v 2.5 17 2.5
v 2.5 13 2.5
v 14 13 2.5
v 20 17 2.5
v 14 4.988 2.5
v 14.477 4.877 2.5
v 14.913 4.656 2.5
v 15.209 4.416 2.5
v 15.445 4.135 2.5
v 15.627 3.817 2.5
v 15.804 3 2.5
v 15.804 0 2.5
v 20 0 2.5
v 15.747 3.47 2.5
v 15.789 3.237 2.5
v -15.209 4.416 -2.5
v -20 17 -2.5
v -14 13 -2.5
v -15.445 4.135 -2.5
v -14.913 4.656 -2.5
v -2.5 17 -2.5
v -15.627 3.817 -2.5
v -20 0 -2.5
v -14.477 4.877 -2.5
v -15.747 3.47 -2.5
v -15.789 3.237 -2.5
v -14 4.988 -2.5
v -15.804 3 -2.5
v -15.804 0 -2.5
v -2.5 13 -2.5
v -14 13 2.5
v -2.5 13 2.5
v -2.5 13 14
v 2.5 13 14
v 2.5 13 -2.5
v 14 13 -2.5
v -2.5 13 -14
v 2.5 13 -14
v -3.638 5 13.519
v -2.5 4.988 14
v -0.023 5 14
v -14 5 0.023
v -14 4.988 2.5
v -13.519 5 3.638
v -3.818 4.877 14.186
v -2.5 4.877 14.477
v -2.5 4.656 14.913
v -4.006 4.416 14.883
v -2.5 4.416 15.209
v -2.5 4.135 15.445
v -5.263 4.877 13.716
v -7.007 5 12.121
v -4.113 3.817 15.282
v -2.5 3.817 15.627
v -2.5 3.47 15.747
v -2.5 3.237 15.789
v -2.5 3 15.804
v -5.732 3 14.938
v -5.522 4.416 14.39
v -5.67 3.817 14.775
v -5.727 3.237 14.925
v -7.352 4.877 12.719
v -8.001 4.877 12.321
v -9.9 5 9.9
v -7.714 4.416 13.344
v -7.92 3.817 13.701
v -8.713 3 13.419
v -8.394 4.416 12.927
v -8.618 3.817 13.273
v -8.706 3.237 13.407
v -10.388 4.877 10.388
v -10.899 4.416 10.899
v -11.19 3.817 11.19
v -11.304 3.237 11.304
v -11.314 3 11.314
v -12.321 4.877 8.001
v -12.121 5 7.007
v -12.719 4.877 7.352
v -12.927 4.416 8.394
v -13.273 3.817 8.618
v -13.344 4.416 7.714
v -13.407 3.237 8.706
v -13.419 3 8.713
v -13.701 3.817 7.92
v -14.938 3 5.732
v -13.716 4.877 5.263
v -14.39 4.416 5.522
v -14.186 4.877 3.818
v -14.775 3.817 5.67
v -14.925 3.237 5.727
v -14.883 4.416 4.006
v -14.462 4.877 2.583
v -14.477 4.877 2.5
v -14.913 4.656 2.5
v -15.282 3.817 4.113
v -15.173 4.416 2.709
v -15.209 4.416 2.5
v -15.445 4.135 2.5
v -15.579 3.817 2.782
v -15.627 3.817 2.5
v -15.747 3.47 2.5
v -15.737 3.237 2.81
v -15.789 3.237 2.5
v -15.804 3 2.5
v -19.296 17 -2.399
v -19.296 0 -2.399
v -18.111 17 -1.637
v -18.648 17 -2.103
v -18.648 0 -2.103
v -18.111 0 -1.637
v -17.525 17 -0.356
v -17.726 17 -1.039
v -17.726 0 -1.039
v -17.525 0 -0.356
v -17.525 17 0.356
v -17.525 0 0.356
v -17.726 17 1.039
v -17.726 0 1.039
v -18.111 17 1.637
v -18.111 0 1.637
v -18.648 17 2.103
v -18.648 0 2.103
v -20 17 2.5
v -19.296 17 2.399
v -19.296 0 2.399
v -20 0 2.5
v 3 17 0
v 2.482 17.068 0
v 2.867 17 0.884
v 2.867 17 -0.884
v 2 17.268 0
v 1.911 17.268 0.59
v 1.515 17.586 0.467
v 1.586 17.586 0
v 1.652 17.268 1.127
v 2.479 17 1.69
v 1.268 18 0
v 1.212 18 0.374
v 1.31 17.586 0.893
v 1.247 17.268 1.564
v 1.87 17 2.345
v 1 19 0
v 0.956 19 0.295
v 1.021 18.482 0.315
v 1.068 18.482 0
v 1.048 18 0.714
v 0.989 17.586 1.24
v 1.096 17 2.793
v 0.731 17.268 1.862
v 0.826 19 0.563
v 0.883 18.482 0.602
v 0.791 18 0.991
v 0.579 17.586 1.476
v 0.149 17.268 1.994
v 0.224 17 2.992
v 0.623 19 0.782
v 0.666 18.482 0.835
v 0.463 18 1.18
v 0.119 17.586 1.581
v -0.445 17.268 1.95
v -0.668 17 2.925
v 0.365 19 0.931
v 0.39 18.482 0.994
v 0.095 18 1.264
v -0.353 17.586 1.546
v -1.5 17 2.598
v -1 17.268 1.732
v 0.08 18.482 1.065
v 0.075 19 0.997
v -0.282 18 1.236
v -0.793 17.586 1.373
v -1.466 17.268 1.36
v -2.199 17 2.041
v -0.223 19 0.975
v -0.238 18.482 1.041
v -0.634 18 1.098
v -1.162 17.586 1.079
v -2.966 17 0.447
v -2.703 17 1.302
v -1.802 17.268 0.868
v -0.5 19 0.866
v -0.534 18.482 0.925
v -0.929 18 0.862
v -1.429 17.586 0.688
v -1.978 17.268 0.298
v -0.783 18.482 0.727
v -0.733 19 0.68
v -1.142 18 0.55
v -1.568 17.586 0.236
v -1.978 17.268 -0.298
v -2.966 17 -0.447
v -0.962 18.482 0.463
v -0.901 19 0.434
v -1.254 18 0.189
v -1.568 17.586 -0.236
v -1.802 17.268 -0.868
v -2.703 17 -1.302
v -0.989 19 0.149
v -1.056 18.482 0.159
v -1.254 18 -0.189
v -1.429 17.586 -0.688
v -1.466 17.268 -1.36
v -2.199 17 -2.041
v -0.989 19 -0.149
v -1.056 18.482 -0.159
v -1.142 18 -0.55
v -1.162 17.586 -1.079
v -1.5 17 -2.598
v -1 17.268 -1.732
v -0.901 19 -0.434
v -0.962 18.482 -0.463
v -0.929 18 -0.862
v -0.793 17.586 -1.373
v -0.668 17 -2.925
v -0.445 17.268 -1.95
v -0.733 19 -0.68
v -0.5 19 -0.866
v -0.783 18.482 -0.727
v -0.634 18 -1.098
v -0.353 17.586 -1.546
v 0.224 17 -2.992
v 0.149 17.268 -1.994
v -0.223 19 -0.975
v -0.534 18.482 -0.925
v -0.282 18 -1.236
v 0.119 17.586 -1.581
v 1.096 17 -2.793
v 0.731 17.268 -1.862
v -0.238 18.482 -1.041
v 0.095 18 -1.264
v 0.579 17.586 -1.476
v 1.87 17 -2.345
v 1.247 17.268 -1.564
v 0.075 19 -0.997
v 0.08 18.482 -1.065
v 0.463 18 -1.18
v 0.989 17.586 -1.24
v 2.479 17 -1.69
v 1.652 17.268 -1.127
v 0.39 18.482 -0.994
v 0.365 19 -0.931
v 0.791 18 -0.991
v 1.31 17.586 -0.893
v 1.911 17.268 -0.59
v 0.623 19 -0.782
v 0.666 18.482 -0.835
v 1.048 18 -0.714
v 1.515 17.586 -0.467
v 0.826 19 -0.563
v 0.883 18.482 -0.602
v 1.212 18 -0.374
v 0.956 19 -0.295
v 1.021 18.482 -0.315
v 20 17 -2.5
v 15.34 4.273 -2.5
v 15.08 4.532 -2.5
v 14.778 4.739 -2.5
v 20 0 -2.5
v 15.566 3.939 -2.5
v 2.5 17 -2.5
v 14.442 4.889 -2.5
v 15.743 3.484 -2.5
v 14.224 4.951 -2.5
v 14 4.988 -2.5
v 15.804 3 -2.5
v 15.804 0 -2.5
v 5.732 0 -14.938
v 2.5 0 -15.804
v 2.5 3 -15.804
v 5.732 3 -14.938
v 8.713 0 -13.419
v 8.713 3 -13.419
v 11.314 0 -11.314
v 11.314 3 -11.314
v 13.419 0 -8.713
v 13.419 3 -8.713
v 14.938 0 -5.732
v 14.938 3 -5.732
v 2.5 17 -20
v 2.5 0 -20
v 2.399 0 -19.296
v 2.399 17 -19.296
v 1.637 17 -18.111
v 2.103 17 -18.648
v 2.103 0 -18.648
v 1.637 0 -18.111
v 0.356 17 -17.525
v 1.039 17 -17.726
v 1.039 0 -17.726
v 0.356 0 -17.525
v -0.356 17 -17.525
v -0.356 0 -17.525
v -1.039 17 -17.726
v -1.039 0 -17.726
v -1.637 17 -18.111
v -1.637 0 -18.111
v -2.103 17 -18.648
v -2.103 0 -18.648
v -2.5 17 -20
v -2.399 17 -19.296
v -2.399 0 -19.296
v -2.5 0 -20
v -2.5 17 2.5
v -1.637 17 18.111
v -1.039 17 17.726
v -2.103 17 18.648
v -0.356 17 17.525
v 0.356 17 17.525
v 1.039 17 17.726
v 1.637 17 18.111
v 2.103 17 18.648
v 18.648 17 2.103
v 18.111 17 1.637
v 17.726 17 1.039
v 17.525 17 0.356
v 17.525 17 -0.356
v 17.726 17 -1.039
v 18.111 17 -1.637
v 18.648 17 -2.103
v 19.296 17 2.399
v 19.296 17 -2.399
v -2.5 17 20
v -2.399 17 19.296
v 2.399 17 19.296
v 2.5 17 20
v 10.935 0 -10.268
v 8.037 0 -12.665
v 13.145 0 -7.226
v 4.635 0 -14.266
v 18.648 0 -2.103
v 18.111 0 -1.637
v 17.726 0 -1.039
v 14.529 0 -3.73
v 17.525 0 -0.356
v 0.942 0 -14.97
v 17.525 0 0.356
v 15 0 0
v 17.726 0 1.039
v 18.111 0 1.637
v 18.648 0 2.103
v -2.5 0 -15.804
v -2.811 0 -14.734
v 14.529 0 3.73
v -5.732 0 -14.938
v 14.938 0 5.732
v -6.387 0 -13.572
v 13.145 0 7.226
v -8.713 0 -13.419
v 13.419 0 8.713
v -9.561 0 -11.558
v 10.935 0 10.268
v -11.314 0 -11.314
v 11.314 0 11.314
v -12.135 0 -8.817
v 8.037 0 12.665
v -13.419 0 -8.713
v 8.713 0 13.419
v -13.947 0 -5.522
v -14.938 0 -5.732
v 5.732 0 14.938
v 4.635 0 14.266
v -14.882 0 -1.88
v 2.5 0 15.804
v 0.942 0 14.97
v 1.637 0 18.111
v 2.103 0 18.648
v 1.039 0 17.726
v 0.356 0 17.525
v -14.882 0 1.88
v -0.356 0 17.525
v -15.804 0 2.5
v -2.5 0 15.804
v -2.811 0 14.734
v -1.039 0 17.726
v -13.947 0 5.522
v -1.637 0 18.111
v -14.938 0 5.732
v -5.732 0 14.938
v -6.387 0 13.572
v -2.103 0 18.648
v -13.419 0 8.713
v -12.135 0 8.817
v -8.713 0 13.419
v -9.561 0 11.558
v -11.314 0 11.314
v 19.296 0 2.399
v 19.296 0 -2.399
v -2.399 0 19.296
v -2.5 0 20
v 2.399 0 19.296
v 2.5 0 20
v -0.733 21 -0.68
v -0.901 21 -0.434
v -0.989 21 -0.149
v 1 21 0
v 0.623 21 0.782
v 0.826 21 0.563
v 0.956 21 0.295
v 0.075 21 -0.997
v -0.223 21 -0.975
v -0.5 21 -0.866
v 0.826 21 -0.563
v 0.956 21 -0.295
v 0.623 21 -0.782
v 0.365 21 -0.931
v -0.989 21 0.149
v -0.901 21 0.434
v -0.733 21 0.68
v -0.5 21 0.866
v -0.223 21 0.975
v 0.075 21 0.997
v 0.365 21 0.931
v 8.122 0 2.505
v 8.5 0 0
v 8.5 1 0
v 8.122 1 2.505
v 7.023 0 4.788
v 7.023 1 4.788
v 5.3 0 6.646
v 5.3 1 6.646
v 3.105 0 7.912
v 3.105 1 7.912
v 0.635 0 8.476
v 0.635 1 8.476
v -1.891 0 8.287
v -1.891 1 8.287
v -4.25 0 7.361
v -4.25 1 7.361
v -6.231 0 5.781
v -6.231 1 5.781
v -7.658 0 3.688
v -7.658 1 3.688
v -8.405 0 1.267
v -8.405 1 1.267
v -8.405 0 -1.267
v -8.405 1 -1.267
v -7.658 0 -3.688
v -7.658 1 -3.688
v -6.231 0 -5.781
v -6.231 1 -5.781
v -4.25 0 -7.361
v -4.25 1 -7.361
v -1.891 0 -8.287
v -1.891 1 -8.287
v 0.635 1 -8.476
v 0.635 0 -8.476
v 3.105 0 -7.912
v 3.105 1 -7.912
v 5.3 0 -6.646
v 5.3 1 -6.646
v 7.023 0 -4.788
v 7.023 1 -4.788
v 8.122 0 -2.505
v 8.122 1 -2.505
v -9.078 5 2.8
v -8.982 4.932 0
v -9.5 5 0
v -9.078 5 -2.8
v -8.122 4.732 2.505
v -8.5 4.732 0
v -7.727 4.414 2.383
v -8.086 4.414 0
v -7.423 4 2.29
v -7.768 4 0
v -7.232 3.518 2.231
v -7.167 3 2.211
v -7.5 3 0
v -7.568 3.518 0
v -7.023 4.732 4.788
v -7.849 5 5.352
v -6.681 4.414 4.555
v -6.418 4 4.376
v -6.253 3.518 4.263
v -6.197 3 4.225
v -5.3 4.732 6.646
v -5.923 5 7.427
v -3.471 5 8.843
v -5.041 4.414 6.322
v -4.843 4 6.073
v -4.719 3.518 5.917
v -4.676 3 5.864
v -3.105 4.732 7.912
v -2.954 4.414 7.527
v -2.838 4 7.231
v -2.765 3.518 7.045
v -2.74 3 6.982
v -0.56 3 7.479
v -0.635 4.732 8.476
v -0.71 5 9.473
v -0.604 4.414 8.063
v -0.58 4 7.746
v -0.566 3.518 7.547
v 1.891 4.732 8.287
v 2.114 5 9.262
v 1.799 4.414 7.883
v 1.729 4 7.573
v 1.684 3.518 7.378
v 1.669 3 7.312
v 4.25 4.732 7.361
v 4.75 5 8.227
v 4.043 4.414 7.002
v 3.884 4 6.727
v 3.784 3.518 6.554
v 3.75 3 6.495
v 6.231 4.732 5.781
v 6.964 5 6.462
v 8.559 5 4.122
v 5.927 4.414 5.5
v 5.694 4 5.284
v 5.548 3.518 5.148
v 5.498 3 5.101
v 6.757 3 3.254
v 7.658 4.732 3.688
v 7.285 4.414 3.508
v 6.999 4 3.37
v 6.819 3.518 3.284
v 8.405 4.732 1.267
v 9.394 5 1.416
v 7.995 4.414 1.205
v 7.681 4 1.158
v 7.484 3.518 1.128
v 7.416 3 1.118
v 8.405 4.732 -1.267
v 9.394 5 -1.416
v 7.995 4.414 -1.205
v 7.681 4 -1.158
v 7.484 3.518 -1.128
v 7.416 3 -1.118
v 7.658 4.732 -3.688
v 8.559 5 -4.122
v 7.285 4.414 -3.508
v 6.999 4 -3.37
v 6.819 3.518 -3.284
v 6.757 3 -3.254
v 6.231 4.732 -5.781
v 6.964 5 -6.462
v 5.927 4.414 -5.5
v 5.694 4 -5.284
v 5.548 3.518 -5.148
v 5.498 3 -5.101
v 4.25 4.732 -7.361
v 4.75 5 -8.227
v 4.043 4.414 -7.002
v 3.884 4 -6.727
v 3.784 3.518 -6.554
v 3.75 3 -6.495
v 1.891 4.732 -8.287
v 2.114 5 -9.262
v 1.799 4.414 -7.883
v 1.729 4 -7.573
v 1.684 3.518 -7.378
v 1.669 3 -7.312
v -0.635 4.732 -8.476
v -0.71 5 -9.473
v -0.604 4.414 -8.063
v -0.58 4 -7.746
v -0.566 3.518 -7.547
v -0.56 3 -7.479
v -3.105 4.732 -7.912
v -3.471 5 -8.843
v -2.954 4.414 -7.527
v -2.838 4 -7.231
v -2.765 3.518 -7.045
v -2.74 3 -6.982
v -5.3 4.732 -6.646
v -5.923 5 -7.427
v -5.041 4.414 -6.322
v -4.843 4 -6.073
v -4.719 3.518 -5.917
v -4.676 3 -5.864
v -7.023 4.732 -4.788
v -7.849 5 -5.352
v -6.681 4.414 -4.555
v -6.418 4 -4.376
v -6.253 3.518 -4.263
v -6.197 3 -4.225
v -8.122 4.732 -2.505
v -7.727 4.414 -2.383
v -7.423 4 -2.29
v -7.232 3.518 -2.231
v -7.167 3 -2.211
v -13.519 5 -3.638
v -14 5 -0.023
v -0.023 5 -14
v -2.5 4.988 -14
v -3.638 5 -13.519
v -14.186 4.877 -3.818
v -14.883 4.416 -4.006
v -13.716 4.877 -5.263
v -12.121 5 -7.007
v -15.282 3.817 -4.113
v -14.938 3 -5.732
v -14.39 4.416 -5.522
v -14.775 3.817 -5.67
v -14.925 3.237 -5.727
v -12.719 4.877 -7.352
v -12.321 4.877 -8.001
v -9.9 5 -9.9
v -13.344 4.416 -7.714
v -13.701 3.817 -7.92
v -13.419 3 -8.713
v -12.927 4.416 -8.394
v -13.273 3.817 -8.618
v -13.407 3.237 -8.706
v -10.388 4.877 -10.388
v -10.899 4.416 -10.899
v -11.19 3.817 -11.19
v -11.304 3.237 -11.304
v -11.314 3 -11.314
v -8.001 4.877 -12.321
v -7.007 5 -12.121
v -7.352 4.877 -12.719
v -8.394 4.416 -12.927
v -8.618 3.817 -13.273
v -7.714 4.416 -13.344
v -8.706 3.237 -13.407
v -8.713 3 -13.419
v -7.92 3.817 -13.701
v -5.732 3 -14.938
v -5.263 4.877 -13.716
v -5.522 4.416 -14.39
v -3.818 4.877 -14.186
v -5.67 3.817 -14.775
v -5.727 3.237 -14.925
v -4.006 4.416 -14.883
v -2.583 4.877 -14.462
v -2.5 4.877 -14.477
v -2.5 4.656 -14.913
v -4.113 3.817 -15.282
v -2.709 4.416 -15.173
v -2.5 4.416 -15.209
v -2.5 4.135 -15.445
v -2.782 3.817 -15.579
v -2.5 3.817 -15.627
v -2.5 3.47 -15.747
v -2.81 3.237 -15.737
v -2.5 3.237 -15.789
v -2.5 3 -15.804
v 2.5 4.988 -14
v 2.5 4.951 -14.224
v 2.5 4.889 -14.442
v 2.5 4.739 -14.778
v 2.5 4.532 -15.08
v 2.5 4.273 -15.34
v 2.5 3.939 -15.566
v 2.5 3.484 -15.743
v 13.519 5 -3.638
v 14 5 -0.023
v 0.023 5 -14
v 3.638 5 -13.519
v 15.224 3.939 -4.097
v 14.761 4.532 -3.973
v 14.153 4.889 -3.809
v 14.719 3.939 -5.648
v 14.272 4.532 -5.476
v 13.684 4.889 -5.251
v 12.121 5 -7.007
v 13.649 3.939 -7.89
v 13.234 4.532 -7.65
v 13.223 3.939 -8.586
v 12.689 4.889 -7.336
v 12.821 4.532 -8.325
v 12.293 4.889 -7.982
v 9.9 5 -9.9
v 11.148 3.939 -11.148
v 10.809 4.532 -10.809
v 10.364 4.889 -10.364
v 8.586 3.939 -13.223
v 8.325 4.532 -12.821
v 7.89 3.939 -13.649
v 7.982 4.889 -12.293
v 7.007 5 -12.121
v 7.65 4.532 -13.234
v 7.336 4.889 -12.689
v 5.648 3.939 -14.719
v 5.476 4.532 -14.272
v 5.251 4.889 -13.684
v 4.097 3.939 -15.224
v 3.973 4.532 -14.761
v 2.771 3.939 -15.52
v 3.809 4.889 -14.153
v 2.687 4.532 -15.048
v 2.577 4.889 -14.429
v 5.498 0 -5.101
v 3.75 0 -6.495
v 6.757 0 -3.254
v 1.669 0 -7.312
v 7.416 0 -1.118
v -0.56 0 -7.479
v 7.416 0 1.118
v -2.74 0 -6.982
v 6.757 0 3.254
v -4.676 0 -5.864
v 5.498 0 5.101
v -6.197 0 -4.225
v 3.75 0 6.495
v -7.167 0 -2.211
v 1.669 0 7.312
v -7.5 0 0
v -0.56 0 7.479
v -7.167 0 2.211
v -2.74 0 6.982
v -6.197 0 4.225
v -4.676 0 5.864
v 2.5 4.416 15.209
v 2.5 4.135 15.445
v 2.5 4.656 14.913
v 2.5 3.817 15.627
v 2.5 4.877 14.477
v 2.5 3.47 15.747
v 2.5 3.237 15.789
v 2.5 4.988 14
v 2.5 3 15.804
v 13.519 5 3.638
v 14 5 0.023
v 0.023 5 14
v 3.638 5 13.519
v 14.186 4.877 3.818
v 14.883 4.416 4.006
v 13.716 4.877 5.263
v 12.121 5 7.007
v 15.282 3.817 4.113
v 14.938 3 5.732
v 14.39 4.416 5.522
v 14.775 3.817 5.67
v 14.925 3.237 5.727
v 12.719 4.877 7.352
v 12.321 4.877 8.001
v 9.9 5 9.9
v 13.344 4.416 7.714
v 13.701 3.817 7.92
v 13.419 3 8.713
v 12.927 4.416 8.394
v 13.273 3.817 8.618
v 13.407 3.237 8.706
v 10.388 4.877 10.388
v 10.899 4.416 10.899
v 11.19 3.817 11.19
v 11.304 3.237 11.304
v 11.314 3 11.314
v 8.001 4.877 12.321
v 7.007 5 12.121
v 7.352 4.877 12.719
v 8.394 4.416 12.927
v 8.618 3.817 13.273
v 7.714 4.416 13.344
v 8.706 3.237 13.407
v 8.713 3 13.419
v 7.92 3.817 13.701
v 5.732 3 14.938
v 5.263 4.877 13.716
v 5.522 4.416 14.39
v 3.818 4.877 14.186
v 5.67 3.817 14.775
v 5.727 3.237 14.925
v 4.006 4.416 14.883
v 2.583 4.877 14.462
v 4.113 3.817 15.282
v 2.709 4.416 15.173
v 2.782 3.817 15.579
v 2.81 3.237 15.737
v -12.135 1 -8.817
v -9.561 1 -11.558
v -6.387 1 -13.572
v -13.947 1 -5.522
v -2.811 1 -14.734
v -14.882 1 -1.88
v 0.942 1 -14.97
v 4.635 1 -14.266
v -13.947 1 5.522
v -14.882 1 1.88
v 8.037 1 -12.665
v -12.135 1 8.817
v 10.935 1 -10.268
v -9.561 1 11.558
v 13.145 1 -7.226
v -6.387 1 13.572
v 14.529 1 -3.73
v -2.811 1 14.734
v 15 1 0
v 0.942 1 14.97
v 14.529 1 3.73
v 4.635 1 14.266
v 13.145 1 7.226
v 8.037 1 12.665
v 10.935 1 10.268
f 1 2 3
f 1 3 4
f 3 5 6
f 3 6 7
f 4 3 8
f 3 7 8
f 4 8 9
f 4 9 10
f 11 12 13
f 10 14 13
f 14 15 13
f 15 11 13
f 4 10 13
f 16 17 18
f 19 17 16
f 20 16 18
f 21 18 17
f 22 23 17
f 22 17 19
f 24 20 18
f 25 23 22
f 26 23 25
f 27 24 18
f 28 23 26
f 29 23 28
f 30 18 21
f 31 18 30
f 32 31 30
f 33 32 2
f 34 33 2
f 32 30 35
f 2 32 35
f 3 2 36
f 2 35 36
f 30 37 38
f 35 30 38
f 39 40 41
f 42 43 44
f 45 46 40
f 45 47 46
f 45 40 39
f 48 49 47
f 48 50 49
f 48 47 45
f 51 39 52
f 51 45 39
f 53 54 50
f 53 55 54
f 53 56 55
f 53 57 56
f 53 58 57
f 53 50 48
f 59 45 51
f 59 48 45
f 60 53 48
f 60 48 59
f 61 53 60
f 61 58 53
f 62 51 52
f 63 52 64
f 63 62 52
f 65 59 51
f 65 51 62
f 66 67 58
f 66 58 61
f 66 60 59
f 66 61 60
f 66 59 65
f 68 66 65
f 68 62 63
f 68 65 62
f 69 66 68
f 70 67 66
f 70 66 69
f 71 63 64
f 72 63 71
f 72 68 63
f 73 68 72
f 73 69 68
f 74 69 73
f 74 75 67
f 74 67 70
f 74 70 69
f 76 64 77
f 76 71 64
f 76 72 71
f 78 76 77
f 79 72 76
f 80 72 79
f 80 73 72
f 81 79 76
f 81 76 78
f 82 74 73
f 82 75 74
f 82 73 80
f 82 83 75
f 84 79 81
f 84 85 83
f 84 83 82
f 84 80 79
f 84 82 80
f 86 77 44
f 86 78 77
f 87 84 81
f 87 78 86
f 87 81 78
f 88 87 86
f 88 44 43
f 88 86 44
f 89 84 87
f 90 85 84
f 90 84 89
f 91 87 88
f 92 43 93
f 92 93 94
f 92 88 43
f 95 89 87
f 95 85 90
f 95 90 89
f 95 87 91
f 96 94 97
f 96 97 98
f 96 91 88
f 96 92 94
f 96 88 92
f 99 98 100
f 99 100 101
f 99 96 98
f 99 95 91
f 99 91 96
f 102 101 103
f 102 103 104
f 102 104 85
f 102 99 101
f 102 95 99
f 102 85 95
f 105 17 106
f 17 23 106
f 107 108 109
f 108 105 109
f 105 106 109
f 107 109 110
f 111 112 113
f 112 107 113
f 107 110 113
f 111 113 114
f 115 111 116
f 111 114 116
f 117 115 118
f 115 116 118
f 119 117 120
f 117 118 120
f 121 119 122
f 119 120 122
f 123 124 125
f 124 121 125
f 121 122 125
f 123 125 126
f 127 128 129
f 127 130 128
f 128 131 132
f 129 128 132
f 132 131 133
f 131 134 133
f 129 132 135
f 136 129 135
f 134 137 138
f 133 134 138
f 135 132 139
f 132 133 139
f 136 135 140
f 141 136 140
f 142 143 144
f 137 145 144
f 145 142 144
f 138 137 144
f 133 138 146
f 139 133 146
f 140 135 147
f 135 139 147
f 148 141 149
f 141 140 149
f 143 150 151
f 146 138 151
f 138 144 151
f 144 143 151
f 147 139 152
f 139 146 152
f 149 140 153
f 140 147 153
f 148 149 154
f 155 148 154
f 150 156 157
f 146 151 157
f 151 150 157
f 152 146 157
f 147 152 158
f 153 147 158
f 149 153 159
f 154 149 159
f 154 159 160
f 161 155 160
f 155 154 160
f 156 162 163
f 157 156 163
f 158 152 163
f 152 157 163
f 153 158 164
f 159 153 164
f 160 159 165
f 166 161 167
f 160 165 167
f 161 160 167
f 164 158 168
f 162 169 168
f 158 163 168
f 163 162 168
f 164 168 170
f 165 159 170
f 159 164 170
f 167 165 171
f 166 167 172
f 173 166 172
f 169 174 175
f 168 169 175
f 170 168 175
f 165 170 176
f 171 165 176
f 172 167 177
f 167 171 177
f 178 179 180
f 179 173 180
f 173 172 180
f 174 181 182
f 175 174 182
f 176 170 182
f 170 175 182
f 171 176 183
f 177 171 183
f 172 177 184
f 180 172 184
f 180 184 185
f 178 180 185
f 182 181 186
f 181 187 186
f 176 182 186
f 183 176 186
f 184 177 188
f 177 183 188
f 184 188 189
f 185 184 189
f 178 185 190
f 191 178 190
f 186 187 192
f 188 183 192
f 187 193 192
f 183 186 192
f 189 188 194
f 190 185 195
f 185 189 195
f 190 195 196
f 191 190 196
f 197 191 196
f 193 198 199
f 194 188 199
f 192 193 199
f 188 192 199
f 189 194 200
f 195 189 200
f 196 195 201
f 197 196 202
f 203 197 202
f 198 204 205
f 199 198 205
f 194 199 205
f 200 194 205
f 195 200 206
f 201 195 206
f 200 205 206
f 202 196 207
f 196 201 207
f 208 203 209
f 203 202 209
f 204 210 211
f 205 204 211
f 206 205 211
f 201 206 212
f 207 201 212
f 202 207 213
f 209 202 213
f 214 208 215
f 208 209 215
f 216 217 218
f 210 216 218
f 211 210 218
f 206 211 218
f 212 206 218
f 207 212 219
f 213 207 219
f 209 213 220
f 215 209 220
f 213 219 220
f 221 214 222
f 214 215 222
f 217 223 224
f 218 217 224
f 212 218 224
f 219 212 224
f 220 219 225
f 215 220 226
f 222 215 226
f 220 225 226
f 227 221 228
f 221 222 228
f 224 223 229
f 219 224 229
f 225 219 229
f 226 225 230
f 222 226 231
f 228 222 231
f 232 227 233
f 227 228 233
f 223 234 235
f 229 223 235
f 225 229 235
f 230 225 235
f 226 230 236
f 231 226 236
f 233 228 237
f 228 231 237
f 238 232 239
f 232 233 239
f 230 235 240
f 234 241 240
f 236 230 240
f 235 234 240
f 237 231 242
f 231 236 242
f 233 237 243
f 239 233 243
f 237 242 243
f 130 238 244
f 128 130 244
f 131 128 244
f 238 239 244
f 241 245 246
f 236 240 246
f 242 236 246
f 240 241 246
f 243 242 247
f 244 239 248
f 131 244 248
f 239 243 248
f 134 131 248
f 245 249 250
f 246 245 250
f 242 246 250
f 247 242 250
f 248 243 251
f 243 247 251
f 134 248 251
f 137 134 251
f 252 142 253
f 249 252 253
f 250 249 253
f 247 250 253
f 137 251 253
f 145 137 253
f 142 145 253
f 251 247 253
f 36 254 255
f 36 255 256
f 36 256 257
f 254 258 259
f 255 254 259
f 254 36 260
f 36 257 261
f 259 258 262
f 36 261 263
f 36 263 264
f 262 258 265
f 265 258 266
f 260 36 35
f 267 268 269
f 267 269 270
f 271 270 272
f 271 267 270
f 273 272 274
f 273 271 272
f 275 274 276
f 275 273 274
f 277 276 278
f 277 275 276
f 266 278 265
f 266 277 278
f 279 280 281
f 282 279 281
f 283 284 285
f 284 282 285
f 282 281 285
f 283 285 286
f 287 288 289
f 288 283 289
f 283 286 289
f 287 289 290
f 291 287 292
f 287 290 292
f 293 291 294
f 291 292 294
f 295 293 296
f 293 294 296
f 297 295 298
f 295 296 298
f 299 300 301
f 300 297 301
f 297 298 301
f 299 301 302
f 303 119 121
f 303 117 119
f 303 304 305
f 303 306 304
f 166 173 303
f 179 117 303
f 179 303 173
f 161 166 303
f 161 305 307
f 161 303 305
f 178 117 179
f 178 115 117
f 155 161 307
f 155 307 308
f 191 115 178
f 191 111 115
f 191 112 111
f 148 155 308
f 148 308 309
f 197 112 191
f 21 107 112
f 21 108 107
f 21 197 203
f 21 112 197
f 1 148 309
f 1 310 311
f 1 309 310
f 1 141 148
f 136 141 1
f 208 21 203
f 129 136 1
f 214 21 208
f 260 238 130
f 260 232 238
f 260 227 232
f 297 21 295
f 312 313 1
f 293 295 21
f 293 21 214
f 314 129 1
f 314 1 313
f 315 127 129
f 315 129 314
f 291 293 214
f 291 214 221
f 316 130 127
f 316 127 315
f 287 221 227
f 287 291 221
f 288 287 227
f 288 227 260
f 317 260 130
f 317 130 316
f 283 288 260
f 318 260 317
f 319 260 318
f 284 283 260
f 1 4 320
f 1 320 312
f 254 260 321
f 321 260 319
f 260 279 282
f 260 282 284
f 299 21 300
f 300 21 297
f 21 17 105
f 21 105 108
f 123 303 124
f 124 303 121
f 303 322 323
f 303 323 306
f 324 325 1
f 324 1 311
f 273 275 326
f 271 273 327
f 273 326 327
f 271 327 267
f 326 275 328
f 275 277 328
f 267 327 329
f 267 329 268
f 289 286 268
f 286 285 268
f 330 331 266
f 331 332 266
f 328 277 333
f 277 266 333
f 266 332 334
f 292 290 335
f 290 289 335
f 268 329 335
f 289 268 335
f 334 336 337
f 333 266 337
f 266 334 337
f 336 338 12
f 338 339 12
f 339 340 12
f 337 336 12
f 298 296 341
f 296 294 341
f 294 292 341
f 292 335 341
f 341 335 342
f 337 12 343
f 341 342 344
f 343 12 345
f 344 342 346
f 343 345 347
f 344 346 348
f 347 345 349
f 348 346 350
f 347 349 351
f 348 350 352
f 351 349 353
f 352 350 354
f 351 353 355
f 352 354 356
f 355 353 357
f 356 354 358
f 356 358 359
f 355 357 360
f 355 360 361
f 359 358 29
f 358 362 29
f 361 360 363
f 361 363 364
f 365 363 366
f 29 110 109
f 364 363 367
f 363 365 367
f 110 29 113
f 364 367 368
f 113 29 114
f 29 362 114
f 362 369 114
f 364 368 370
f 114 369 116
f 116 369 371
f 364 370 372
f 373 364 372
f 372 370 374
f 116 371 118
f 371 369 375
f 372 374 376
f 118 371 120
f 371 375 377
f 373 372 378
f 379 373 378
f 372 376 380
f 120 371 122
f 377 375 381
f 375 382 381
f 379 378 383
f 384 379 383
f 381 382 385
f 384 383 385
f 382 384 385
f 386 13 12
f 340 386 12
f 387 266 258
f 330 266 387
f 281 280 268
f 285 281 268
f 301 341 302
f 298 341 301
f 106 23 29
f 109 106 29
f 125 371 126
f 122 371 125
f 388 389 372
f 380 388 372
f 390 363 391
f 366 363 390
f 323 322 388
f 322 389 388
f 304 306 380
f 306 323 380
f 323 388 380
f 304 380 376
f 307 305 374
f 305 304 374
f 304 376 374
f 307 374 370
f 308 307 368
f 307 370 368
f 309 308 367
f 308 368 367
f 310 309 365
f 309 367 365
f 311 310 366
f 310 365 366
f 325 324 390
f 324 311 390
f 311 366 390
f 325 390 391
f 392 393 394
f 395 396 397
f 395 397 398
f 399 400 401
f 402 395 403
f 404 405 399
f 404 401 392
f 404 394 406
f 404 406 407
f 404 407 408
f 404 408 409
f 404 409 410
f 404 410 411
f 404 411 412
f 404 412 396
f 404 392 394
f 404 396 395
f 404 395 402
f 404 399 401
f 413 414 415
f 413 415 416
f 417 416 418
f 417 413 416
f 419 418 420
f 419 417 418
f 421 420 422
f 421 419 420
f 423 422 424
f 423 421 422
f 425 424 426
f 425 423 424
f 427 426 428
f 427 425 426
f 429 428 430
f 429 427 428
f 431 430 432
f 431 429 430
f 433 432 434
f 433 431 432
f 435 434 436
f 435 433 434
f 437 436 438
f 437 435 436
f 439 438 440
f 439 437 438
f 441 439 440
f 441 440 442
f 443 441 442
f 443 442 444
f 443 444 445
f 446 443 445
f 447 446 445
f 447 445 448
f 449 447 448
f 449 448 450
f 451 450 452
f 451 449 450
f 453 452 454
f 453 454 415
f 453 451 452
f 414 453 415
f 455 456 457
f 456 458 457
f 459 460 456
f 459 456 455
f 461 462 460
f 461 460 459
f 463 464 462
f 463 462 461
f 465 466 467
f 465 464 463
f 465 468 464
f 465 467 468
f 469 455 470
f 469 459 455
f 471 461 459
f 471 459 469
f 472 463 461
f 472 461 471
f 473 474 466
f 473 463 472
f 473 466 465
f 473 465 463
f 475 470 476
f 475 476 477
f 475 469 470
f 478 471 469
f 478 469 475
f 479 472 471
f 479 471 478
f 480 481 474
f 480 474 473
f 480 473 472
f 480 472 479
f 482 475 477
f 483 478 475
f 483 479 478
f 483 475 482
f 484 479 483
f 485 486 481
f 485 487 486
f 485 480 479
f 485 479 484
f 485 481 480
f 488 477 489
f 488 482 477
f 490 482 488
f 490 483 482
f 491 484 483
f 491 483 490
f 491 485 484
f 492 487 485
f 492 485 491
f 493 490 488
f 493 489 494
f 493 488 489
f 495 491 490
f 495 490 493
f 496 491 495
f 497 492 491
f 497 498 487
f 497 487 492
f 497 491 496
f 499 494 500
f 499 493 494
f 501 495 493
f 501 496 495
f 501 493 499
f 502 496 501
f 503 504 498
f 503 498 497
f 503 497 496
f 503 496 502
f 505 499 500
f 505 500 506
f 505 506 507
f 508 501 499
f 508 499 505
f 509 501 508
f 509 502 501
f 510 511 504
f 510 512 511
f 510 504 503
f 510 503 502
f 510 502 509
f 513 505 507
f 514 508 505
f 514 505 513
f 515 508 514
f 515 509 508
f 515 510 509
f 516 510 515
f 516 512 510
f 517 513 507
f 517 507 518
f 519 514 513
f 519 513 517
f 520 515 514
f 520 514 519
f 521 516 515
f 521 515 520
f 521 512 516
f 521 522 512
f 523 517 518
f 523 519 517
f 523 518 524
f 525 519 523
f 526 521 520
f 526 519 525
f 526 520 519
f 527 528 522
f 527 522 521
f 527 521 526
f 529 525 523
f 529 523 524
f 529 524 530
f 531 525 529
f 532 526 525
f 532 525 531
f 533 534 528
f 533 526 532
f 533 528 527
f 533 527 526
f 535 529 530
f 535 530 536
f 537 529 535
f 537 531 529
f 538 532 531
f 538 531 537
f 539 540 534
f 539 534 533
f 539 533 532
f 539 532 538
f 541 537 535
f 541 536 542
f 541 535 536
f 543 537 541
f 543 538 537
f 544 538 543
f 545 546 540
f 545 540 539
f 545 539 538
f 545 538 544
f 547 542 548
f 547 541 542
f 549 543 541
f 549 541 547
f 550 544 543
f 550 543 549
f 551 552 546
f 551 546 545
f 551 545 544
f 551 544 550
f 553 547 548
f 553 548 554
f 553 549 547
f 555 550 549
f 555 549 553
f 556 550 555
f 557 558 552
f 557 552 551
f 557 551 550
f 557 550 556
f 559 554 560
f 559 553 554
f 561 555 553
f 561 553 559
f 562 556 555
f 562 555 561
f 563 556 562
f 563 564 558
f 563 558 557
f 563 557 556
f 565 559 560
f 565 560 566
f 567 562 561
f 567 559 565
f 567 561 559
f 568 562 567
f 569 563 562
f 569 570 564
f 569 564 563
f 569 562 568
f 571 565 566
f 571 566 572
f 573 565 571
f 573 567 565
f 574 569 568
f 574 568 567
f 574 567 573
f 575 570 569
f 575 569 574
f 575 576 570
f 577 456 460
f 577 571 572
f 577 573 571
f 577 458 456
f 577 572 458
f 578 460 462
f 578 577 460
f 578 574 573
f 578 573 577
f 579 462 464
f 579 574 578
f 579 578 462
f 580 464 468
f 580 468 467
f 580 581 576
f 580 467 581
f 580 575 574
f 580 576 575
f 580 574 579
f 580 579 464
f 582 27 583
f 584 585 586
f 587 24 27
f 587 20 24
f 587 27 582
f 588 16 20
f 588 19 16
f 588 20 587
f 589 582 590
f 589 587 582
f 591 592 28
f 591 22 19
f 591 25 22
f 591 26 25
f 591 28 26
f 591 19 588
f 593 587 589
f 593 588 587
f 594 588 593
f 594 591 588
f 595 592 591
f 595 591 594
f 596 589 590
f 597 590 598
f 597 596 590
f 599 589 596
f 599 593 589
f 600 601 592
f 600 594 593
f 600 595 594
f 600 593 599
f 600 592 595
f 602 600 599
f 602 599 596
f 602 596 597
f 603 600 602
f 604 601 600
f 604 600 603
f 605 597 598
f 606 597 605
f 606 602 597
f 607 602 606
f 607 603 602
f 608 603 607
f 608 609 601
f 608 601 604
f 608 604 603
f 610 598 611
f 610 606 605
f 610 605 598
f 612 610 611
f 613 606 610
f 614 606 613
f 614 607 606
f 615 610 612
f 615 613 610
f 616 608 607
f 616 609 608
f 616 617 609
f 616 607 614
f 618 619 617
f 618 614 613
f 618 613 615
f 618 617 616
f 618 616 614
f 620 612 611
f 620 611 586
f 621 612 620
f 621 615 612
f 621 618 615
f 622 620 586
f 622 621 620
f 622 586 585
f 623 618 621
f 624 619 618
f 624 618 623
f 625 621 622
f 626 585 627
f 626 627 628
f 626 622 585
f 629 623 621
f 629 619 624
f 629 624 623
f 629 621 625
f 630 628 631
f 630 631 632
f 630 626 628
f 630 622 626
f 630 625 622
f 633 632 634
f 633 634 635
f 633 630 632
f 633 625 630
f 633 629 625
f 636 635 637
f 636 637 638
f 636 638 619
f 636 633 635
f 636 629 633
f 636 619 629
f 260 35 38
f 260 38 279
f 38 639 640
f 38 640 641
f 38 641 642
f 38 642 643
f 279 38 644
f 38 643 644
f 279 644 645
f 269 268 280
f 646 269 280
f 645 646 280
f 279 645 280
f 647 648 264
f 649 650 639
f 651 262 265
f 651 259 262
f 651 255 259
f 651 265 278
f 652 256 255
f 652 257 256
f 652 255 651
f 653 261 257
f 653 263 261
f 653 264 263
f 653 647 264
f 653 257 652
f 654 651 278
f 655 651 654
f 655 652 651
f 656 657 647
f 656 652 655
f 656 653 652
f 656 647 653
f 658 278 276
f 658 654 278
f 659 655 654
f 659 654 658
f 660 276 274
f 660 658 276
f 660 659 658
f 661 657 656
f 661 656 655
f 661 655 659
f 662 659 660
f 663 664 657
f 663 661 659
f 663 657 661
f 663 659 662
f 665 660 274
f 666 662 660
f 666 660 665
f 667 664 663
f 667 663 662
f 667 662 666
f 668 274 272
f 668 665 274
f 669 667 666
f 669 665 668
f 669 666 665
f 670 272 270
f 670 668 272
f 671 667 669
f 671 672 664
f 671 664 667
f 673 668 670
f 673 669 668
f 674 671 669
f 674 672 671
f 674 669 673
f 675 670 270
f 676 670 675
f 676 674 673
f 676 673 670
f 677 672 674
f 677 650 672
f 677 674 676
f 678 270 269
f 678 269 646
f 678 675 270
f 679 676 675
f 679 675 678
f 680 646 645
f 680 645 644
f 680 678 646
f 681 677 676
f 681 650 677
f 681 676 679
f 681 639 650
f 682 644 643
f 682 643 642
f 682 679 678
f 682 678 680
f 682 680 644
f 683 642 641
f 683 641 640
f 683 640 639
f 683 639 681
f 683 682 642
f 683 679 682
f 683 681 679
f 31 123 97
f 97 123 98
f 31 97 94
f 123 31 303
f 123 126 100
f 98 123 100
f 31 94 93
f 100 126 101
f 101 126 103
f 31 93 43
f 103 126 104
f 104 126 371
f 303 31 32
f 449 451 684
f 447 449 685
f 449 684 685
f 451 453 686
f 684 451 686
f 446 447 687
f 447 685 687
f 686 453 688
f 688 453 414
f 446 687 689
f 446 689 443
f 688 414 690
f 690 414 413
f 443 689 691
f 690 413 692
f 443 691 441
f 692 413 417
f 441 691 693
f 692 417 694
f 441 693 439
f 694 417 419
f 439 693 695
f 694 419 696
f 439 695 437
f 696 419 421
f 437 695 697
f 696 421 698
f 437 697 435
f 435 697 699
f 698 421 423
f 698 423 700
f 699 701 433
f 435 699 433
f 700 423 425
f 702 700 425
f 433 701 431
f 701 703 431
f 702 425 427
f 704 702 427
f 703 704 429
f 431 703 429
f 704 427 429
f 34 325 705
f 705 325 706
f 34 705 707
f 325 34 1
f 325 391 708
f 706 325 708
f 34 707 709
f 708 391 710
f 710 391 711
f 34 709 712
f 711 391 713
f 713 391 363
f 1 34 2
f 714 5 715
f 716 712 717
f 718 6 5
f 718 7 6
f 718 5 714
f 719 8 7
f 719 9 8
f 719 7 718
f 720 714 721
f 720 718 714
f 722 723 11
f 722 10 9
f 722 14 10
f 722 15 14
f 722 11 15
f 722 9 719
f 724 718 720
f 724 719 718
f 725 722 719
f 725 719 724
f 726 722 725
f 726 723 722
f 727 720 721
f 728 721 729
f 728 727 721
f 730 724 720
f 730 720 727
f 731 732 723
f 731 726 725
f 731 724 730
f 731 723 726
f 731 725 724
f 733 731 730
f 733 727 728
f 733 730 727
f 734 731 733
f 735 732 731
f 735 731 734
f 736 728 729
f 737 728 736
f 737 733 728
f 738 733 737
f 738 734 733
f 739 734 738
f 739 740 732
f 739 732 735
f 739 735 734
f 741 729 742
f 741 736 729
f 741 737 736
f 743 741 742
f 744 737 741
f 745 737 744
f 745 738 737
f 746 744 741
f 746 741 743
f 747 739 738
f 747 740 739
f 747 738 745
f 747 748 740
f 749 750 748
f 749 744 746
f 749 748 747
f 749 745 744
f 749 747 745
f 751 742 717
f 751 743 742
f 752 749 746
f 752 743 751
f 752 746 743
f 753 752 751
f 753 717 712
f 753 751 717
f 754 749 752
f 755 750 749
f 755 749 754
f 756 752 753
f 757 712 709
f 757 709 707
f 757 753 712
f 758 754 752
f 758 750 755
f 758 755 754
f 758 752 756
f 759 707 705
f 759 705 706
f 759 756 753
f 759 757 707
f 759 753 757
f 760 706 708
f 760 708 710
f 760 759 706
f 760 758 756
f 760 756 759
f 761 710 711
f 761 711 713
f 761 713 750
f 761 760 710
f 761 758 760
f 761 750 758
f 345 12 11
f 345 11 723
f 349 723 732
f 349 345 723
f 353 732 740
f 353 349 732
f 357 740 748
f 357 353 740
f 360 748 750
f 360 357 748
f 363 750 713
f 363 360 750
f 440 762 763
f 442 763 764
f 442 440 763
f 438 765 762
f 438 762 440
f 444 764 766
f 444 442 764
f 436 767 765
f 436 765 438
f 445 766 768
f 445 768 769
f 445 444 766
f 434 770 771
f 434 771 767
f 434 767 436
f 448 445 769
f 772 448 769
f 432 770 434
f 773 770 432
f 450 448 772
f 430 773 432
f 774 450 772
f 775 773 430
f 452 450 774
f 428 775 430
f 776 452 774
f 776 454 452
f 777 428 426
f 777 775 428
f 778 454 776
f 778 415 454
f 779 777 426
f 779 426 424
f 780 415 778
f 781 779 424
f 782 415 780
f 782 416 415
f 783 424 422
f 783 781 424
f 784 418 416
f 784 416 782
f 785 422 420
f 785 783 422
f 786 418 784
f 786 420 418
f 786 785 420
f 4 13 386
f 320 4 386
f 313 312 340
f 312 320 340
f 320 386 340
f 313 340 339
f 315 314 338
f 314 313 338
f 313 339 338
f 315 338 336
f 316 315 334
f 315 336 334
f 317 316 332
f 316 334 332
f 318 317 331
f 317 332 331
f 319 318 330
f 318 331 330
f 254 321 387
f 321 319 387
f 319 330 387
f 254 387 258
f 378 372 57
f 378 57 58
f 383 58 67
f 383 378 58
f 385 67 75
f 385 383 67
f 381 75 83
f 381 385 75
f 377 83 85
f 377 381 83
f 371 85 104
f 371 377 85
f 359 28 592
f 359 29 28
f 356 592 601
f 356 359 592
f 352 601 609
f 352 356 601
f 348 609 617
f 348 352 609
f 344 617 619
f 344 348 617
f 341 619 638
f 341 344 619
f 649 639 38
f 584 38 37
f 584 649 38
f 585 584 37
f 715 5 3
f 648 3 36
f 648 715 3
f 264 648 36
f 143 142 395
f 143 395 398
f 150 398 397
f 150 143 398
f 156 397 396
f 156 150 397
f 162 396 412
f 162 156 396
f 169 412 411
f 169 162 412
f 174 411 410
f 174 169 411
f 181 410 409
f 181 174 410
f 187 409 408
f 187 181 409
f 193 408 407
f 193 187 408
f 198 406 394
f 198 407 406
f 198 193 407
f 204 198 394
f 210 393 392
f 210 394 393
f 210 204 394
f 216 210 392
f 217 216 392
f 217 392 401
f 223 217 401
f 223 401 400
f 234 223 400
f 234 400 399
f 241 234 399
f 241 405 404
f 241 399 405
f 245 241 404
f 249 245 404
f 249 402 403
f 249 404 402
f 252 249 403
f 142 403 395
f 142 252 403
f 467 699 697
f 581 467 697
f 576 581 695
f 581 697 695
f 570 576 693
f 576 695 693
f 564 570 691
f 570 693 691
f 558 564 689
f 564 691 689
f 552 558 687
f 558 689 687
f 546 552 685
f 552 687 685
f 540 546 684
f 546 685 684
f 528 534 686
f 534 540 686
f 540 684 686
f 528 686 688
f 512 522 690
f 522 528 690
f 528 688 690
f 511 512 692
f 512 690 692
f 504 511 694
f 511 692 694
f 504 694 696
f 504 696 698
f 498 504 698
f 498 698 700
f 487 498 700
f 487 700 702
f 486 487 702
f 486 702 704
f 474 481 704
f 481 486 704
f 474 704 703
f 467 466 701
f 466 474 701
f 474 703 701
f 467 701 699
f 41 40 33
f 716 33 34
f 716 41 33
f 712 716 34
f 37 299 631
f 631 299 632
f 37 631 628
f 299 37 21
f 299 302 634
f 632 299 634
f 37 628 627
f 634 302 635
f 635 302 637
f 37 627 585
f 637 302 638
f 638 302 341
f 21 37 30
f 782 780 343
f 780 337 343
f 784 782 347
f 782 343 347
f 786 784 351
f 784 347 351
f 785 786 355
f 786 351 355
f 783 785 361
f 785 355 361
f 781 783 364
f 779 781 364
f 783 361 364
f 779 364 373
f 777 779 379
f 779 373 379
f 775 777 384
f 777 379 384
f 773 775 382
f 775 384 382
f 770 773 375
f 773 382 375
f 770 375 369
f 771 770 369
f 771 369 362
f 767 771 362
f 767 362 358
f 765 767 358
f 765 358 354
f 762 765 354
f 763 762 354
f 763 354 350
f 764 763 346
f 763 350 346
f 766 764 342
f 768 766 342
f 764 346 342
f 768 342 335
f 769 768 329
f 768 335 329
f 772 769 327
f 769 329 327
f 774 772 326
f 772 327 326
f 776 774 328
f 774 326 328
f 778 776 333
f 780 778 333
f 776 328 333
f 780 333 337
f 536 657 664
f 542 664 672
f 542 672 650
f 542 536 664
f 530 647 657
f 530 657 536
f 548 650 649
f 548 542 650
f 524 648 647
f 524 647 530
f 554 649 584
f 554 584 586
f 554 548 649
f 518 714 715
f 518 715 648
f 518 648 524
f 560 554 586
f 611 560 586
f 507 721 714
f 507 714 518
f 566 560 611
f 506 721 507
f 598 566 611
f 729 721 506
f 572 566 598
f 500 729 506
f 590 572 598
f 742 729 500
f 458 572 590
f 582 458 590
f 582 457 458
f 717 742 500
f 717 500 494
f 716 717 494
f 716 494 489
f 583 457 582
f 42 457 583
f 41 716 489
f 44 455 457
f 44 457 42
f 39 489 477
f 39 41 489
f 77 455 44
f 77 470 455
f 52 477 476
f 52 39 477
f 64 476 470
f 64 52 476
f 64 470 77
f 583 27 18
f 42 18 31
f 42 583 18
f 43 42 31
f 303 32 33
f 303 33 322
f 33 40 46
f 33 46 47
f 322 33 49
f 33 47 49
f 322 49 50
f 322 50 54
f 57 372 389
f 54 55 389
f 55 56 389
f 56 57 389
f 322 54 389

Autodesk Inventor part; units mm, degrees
ref_plane "YZ Plane" through (0, 0, 0) normal (1, 0, 0) x (0, 1, 0)
ref_plane "XZ Plane" through (0, 0, 0) normal (0, 1, 0) x (-1, 0, 0)
ref_plane "XY Plane" through (0, 0, 0) normal (0, 0, 1) x (1, 0, 0)
sketch "Sketch14" plane through (0, 0, 0) normal (0, 1, 0) x (-1, 0, 0)
  arc A0 (20, 2.5) -> (20, -2.5) centre (20, 0) ccw
  arc A1 (-2.5, 20) -> (2.5, 20) centre (0, 20) ccw
  arc A2 (-20, -2.5) -> (-20, 2.5) centre (-20, 0) ccw
  arc A3 (2.5, -20) -> (-2.5, -20) centre (0, -20) ccw
  line L0 (20, -2.5) -> (15.8035, -2.5)
  line L1 (20, 2.5) -> (15.8035, 2.5)
  line L2 (2.5, 20) -> (2.5, 15.8035)
  line L3 (-2.5, 20) -> (-2.5, 15.8035)
  line L4 (-20, 2.5) -> (-15.8035, 2.5)
  line L5 (-20, -2.5) -> (-15.8035, -2.5)
  line L6 (-2.5, -20) -> (-2.5, -15.8035)
  line L7 (2.5, -20) -> (2.5, -15.8035)
  arc A4 (2.5, -15.8035) -> (15.8035, -2.5) centre (0, 0) ccw
  arc A5 (15.8035, 2.5) -> (2.5, 15.8035) centre (0, 0) ccw
  arc A6 (-2.5, 15.8035) -> (-15.8035, 2.5) centre (0, 0) ccw
  arc A7 (-15.8035, -2.5) -> (-2.5, -15.8035) centre (0, 0) ccw
  circle A8 centre (0, 0) radius 7.5
  dimension "d87" = 2.5
  dimension "d88" = 2.5
  dimension "d89" = 2.5
  dimension "d90" = 2.5
  dimension "d91" = 15
extrude "Extrusion15" add sketch "Sketch14" along normal blind 5
sketch "Sketch15" plane through (0, 0, 0) normal (0, -1, 0) x (1, 0, 0)
  circle A0 centre (0, 0) radius 8.5
  circle A1 centre (0, 0) radius 15
  dimension "d94" = 17
  dimension "d95" = 30
extrude "Extrusion16" cut sketch "Sketch15" against normal blind 1
sketch "Sketch16" plane through (0, 5, 0) normal (0, 1, 0) x (1, 0, 0)
  arc A0 (-20, -2.5) -> (-20, 2.5) centre (-20, 0) ccw projected
  arc A1 (-20, -2.5) -> (-20, 2.5) centre (-20, 0) ccw
  arc A2 (2.5, -20) -> (-2.5, -20) centre (0, -20) ccw projected
  arc A3 (2.5, -20) -> (-2.5, -20) centre (0, -20) ccw
  arc A4 (20, 2.5) -> (20, -2.5) centre (20, 0) ccw
  arc A5 (-2.5, 20) -> (2.5, 20) centre (0, 20) ccw
  line L0 (-20, 2.5) -> (-14, 2.5)
  line L1 (-14, 2.5) -> (-14, -2.5)
  line L2 (-14, -2.5) -> (-20, -2.5)
  line L3 (-2.5, -15.8035) -> (-2.5, -20) projected
  line L4 (-2.5, -20) -> (-2.5, -14)
  line L5 (-2.5, -14) -> (2.5, -14)
  line L6 (2.5, -20) -> (2.5, -15.8035) projected
  line L7 (2.5, -14) -> (2.5, -20)
  line L8 (20, -2.5) -> (14, -2.5)
  line L9 (15.8035, -2.5) -> (20, -2.5) projected
  line L10 (14, -2.5) -> (14, 2.5)
  line L11 (20, 2.5) -> (15.8035, 2.5) projected
  line L12 (14, 2.5) -> (20, 2.5)
  line L13 (2.5, 15.8035) -> (2.5, 20) projected
  line L14 (2.5, 20) -> (2.5, 14)
  line L15 (2.5, 14) -> (-2.5, 14)
  arc A6 (-2.5, 20) -> (2.5, 20) centre (0, 20) ccw projected
  line L16 (-2.5, 14) -> (-2.5, 20)
  point P0 (0, 0)
extrude "Extrusion17" add sketch "Sketch16" along normal blind 8
sketch "Sketch17" plane through (0, 13, 0) normal (0, 1, 0) x (1, 0, 0)
  line L0 (-2.5, 20) -> (-2.5, 15.8035) projected
  arc A0 (-2.5, 20) -> (2.5, 20) centre (0, 20) ccw projected
  arc A1 (-2.5, 20) -> (2.5, 20) centre (0, 20) ccw
  arc A2 (20, 2.5) -> (20, -2.5) centre (20, 0) ccw projected
  arc A3 (20, 2.5) -> (20, -2.5) centre (20, 0) ccw
  arc A4 (2.5, -20) -> (-2.5, -20) centre (0, -20) ccw
  line L1 (-20, -2.5) -> (-2.5, -2.5)
  line L2 (-2.5, -2.5) -> (-2.5, -20)
  line L3 (2.5, -20) -> (2.5, -2.5)
  line L4 (2.5, -2.5) -> (20, -2.5)
  line L5 (20, 2.5) -> (2.5, 2.5)
  line L6 (2.5, 15.8035) -> (2.5, 20) projected
  line L7 (2.5, 2.5) -> (2.5, 20)
  line L8 (-2.5, 20) -> (-2.5, 2.5)
  line L9 (-20, 2.5) -> (-2.5, 2.5)
  arc A5 (-20, -2.5) -> (-20, 2.5) centre (-20, 0) ccw
  point P0 (0, 0)
extrude "Extrusion18" add sketch "Sketch17" along normal blind 4
sketch "Sketch18" plane through (0, 17, 0) normal (0, 1, 0) x (1, 0, 0)
  circle A0 centre (0, 0) radius 1
  dimension "d102" = 2
extrude "Extrusion19" add sketch "Sketch18" along normal blind 4
fillet "Fillet1" radius 2 5 edges at (11.3137, 5, -11.3137) (7.5, 5, 0) (-11.3137, 5, -11.3137) (-11.3137, 5, 11.3137) (11.3137, 5, 11.3137)
fillet "Fillet2" radius 2 1 edges at (-1, 17, 0)
properties part number "CheckValveValve1.0"
